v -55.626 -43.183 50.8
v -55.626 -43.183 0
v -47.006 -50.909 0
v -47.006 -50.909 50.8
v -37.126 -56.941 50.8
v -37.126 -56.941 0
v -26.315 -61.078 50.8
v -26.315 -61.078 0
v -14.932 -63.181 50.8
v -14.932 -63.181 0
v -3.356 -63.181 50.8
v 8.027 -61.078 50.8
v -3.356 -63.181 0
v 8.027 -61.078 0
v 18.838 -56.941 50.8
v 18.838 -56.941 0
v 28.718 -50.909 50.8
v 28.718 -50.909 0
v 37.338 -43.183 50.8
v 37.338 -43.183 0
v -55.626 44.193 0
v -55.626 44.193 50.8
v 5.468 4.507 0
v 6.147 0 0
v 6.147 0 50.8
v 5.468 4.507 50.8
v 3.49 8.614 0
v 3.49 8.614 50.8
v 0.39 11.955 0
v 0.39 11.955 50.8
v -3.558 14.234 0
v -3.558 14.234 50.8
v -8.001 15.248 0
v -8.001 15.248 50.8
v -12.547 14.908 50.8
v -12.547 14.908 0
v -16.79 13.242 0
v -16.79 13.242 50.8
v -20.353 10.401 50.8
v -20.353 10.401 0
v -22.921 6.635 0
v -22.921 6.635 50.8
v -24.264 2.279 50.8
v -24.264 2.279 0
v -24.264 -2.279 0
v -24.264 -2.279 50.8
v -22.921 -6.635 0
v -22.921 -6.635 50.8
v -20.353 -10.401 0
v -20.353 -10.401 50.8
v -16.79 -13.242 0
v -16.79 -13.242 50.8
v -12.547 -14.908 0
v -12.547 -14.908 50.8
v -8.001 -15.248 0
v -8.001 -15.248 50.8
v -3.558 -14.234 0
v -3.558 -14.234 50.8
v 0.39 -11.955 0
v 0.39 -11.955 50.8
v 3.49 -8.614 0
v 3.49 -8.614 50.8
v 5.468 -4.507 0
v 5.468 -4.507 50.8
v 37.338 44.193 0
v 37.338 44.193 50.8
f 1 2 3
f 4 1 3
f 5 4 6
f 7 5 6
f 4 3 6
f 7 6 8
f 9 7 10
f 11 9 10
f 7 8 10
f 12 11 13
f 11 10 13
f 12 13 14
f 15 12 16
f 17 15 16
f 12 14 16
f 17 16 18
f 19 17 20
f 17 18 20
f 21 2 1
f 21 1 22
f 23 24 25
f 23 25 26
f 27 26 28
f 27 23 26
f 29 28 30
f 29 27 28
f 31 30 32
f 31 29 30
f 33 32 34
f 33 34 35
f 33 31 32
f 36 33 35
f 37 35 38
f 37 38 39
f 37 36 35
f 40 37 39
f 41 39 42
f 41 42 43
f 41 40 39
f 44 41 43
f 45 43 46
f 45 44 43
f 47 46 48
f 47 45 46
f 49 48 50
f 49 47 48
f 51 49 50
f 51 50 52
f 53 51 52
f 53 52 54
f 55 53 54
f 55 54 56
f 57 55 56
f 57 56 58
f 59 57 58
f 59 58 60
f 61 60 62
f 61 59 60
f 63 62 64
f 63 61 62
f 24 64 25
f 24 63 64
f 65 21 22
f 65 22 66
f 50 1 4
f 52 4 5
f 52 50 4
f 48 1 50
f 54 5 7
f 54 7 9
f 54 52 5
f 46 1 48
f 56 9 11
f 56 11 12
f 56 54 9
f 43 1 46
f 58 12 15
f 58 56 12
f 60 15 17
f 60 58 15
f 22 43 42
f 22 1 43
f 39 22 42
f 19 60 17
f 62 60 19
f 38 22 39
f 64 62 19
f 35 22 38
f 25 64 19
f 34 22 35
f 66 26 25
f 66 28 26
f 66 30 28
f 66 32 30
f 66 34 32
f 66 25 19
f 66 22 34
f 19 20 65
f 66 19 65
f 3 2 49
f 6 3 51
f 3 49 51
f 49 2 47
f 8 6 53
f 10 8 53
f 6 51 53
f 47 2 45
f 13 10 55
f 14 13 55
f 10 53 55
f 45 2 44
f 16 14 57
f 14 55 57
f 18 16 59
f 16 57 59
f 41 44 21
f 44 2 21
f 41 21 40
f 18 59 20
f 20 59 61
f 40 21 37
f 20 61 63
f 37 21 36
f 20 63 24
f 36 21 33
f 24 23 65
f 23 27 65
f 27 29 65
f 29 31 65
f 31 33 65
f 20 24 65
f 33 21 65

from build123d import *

# Parameters (mm, degrees)
F0_W     = 92.964003
F0_H     = 87.376002
F0_R     = 15.291068
F1_DEPTH = 50.8


with BuildPart() as f1:
    # F0 (on Top) → F1 (new body)
    with BuildSketch(Plane.XY):
        with Locations((-9.143999, 0.505356)):
            Rectangle(F0_W, F0_H)
        with Locations((-9.144, 0)):
            Circle(F0_R, mode=Mode.SUBTRACT)
        with BuildLine():
            Line((37.338002, -43.182645), (-55.626001, -43.182645))
            ThreePointArc((-55.626001, -43.182645), (-9.144, -63.445388), (37.338002, -43.182645))
        make_face()
    extrude(amount=F1_DEPTH)


solid = f1.part
